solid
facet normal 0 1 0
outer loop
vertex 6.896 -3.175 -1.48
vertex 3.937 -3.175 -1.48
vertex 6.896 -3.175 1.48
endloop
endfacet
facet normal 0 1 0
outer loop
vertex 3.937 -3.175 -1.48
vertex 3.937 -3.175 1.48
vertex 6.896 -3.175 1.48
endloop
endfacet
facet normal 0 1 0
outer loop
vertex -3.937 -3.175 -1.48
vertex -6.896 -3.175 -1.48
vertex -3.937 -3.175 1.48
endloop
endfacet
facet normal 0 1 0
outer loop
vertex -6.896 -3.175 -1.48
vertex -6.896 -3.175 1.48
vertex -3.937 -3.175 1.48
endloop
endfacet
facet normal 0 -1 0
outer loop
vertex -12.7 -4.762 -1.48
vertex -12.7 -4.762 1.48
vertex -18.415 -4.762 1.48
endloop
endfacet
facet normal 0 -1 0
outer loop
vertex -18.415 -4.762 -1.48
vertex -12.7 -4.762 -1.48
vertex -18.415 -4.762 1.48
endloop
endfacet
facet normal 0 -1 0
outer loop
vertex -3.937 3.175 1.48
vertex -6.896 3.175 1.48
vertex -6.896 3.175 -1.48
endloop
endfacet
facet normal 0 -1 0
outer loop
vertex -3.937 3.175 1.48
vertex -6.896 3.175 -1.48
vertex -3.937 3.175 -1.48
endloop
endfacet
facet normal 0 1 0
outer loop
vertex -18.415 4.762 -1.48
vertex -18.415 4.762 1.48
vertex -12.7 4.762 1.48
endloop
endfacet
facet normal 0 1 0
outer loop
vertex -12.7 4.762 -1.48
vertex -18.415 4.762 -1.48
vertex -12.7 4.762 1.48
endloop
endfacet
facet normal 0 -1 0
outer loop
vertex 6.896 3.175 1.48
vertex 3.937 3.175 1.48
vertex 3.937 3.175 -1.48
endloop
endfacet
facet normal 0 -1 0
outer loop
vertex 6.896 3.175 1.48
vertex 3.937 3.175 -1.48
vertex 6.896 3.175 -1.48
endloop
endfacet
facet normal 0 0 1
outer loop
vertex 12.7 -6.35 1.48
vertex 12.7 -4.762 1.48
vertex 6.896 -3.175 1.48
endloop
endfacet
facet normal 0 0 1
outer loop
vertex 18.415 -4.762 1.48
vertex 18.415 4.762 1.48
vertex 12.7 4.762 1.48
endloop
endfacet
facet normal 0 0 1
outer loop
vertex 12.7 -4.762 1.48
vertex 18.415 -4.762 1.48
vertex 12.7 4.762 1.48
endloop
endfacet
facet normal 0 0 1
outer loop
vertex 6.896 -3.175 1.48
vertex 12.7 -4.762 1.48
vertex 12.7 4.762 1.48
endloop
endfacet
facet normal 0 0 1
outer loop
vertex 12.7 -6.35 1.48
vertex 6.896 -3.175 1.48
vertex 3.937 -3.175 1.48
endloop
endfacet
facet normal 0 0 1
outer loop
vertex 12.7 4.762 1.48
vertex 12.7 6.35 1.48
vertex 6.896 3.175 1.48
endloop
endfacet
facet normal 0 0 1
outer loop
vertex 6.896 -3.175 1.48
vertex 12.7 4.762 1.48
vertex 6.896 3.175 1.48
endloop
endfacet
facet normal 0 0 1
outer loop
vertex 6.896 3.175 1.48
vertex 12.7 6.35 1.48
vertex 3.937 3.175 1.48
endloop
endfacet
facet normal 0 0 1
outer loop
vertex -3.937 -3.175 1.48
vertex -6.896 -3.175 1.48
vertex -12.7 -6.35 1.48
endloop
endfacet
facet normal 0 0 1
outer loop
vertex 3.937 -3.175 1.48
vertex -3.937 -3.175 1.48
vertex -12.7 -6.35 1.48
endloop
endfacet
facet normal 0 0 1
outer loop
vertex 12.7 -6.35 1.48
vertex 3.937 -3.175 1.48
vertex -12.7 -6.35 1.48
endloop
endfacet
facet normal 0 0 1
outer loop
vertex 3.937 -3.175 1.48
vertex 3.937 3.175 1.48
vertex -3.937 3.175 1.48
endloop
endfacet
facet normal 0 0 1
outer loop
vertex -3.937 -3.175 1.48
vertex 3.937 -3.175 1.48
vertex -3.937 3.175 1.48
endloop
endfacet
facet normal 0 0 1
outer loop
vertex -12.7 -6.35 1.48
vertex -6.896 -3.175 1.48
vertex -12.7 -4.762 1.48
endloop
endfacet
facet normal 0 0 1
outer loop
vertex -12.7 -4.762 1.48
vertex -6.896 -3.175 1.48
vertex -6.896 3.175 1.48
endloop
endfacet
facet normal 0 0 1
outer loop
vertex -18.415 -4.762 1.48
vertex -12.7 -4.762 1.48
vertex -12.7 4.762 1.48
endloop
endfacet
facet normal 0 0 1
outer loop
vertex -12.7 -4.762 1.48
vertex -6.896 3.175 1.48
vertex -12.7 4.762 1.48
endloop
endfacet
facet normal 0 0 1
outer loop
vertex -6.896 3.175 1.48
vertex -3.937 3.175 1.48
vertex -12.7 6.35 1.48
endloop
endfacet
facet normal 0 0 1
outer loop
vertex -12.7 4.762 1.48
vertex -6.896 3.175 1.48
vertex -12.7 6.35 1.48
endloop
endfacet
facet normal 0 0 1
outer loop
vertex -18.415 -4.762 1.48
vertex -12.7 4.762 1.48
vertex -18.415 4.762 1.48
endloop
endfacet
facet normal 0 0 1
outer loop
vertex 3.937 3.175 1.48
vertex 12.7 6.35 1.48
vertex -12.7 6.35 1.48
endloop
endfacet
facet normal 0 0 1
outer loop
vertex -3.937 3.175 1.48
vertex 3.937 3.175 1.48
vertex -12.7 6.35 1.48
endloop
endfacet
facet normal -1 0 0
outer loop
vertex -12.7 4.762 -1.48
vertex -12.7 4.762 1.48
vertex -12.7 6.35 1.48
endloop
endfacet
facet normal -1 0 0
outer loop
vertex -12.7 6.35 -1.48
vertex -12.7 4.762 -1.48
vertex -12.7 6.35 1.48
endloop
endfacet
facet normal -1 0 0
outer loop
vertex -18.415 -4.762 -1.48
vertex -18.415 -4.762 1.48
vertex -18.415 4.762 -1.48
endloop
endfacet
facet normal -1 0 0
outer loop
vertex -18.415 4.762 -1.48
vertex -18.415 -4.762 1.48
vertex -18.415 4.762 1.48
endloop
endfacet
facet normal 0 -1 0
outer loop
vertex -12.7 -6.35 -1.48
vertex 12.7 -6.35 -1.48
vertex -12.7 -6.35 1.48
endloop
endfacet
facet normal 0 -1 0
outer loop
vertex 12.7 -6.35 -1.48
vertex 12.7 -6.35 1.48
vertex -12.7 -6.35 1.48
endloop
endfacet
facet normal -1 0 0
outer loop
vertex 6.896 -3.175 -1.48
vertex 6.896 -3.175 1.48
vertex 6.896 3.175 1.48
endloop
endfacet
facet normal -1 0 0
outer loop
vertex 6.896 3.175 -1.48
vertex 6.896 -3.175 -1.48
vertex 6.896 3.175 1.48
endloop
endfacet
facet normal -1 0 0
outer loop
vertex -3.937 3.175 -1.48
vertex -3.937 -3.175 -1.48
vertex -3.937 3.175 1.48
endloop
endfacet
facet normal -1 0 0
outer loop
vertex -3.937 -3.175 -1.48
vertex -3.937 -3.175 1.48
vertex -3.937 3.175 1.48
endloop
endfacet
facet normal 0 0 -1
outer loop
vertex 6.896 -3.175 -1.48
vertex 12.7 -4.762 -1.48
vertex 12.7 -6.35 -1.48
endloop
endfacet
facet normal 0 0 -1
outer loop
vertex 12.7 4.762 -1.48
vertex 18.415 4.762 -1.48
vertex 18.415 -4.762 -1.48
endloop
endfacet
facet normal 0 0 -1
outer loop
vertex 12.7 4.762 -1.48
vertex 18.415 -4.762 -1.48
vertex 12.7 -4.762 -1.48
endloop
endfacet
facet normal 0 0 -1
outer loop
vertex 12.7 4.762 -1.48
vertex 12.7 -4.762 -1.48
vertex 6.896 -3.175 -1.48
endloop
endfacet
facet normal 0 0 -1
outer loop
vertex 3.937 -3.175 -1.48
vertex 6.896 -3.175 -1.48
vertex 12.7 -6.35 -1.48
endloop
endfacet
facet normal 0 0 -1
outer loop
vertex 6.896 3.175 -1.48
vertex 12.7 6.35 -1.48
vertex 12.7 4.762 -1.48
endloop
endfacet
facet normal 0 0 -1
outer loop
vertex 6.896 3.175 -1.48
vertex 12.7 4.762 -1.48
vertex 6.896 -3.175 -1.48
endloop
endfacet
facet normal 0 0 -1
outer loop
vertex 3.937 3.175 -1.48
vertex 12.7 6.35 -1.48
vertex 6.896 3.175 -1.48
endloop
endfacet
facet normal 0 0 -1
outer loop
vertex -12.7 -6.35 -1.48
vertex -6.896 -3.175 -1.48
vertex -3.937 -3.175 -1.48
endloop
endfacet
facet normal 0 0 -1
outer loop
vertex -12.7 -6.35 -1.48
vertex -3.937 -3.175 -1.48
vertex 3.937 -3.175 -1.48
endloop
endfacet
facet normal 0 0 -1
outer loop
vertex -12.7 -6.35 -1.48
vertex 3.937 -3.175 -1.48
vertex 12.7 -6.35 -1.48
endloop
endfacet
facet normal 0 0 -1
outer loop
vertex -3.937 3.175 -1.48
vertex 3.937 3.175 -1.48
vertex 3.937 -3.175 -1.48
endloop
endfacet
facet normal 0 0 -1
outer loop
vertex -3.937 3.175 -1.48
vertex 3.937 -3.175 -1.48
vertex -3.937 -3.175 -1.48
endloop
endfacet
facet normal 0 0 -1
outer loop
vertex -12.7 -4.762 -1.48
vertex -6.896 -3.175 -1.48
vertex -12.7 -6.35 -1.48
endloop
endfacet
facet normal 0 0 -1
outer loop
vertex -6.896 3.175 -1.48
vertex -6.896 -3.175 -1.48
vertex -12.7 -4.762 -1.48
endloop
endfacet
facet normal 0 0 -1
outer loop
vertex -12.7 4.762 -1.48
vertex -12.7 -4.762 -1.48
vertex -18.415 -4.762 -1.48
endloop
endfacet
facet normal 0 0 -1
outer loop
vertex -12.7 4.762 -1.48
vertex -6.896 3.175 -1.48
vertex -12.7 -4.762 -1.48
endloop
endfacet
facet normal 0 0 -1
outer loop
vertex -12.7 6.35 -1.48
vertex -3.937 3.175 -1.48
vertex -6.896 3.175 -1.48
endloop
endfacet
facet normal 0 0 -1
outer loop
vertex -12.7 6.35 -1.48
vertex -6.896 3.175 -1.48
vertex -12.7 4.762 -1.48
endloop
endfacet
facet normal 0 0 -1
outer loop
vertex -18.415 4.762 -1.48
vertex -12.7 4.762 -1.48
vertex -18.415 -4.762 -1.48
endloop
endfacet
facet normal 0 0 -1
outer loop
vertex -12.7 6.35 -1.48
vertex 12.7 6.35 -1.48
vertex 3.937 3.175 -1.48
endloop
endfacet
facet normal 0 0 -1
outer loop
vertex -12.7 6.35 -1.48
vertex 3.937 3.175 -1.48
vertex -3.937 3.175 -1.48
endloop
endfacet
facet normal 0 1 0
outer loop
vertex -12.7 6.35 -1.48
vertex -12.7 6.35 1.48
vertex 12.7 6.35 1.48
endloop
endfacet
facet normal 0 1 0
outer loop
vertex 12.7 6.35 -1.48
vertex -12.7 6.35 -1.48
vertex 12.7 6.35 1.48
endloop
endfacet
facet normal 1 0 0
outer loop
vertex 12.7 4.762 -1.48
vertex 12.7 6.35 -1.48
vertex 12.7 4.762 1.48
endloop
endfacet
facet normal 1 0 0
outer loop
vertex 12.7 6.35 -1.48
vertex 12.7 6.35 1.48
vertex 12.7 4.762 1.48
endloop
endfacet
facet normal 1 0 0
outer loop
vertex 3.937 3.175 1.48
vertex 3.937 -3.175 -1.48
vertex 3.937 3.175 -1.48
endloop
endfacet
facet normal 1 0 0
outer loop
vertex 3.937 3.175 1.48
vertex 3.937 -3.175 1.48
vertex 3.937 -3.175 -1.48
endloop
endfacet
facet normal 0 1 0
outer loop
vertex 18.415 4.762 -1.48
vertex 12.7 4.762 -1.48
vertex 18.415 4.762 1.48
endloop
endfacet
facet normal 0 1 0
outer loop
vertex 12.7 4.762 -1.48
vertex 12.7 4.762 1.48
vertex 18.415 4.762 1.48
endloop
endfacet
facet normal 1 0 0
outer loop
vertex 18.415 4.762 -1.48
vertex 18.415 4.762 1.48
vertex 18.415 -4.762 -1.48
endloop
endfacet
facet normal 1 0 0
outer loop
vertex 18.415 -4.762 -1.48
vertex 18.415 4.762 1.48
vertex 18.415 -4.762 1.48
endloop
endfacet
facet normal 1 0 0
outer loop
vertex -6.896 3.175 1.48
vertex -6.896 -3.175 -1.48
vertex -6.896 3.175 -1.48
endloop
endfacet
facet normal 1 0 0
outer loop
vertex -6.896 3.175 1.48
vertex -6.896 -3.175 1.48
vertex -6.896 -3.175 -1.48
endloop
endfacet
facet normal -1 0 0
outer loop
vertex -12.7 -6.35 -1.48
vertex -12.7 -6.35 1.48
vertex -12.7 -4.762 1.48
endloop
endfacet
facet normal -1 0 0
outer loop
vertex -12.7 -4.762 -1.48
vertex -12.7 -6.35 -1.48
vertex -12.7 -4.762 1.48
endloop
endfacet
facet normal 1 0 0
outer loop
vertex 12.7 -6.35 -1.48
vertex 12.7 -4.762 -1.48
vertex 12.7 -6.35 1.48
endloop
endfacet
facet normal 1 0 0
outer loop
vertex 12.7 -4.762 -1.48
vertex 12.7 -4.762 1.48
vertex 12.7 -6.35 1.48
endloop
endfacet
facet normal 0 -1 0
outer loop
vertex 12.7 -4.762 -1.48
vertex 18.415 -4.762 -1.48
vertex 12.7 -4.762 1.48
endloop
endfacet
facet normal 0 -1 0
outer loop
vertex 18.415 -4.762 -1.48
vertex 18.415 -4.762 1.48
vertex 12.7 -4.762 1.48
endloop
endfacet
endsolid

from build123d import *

# Parameters (mm, degrees)
SKETCH3_W           = 2.9591
SKETCH3_H           = 6.35
BOSS_EXTRUDE1_DEPTH = 1.47955


with BuildPart() as part:
    # Sketch3 → Boss-Extrude1 (new body, symmetric)
    with BuildSketch(Plane.XY):
        Polygon((-12.7, 6.35), (12.7, 6.35), (12.7, 4.7625), (18.415, 4.7625), (18.415, -4.7625), (12.7, -4.7625), (12.7, -6.35), (-12.7, -6.35), (-12.7, -4.7625), (-18.415, -4.7625), (-18.415, 4.7625), (-12.7, 4.7625), align=None)
        with Locations((-5.41655, 0)):
            Rectangle(SKETCH3_W, SKETCH3_H, mode=Mode.SUBTRACT)
        with Locations((5.41655, 0)):
            Rectangle(SKETCH3_W, SKETCH3_H, mode=Mode.SUBTRACT)
    extrude(amount=BOSS_EXTRUDE1_DEPTH, both=True)


solid = part.part
